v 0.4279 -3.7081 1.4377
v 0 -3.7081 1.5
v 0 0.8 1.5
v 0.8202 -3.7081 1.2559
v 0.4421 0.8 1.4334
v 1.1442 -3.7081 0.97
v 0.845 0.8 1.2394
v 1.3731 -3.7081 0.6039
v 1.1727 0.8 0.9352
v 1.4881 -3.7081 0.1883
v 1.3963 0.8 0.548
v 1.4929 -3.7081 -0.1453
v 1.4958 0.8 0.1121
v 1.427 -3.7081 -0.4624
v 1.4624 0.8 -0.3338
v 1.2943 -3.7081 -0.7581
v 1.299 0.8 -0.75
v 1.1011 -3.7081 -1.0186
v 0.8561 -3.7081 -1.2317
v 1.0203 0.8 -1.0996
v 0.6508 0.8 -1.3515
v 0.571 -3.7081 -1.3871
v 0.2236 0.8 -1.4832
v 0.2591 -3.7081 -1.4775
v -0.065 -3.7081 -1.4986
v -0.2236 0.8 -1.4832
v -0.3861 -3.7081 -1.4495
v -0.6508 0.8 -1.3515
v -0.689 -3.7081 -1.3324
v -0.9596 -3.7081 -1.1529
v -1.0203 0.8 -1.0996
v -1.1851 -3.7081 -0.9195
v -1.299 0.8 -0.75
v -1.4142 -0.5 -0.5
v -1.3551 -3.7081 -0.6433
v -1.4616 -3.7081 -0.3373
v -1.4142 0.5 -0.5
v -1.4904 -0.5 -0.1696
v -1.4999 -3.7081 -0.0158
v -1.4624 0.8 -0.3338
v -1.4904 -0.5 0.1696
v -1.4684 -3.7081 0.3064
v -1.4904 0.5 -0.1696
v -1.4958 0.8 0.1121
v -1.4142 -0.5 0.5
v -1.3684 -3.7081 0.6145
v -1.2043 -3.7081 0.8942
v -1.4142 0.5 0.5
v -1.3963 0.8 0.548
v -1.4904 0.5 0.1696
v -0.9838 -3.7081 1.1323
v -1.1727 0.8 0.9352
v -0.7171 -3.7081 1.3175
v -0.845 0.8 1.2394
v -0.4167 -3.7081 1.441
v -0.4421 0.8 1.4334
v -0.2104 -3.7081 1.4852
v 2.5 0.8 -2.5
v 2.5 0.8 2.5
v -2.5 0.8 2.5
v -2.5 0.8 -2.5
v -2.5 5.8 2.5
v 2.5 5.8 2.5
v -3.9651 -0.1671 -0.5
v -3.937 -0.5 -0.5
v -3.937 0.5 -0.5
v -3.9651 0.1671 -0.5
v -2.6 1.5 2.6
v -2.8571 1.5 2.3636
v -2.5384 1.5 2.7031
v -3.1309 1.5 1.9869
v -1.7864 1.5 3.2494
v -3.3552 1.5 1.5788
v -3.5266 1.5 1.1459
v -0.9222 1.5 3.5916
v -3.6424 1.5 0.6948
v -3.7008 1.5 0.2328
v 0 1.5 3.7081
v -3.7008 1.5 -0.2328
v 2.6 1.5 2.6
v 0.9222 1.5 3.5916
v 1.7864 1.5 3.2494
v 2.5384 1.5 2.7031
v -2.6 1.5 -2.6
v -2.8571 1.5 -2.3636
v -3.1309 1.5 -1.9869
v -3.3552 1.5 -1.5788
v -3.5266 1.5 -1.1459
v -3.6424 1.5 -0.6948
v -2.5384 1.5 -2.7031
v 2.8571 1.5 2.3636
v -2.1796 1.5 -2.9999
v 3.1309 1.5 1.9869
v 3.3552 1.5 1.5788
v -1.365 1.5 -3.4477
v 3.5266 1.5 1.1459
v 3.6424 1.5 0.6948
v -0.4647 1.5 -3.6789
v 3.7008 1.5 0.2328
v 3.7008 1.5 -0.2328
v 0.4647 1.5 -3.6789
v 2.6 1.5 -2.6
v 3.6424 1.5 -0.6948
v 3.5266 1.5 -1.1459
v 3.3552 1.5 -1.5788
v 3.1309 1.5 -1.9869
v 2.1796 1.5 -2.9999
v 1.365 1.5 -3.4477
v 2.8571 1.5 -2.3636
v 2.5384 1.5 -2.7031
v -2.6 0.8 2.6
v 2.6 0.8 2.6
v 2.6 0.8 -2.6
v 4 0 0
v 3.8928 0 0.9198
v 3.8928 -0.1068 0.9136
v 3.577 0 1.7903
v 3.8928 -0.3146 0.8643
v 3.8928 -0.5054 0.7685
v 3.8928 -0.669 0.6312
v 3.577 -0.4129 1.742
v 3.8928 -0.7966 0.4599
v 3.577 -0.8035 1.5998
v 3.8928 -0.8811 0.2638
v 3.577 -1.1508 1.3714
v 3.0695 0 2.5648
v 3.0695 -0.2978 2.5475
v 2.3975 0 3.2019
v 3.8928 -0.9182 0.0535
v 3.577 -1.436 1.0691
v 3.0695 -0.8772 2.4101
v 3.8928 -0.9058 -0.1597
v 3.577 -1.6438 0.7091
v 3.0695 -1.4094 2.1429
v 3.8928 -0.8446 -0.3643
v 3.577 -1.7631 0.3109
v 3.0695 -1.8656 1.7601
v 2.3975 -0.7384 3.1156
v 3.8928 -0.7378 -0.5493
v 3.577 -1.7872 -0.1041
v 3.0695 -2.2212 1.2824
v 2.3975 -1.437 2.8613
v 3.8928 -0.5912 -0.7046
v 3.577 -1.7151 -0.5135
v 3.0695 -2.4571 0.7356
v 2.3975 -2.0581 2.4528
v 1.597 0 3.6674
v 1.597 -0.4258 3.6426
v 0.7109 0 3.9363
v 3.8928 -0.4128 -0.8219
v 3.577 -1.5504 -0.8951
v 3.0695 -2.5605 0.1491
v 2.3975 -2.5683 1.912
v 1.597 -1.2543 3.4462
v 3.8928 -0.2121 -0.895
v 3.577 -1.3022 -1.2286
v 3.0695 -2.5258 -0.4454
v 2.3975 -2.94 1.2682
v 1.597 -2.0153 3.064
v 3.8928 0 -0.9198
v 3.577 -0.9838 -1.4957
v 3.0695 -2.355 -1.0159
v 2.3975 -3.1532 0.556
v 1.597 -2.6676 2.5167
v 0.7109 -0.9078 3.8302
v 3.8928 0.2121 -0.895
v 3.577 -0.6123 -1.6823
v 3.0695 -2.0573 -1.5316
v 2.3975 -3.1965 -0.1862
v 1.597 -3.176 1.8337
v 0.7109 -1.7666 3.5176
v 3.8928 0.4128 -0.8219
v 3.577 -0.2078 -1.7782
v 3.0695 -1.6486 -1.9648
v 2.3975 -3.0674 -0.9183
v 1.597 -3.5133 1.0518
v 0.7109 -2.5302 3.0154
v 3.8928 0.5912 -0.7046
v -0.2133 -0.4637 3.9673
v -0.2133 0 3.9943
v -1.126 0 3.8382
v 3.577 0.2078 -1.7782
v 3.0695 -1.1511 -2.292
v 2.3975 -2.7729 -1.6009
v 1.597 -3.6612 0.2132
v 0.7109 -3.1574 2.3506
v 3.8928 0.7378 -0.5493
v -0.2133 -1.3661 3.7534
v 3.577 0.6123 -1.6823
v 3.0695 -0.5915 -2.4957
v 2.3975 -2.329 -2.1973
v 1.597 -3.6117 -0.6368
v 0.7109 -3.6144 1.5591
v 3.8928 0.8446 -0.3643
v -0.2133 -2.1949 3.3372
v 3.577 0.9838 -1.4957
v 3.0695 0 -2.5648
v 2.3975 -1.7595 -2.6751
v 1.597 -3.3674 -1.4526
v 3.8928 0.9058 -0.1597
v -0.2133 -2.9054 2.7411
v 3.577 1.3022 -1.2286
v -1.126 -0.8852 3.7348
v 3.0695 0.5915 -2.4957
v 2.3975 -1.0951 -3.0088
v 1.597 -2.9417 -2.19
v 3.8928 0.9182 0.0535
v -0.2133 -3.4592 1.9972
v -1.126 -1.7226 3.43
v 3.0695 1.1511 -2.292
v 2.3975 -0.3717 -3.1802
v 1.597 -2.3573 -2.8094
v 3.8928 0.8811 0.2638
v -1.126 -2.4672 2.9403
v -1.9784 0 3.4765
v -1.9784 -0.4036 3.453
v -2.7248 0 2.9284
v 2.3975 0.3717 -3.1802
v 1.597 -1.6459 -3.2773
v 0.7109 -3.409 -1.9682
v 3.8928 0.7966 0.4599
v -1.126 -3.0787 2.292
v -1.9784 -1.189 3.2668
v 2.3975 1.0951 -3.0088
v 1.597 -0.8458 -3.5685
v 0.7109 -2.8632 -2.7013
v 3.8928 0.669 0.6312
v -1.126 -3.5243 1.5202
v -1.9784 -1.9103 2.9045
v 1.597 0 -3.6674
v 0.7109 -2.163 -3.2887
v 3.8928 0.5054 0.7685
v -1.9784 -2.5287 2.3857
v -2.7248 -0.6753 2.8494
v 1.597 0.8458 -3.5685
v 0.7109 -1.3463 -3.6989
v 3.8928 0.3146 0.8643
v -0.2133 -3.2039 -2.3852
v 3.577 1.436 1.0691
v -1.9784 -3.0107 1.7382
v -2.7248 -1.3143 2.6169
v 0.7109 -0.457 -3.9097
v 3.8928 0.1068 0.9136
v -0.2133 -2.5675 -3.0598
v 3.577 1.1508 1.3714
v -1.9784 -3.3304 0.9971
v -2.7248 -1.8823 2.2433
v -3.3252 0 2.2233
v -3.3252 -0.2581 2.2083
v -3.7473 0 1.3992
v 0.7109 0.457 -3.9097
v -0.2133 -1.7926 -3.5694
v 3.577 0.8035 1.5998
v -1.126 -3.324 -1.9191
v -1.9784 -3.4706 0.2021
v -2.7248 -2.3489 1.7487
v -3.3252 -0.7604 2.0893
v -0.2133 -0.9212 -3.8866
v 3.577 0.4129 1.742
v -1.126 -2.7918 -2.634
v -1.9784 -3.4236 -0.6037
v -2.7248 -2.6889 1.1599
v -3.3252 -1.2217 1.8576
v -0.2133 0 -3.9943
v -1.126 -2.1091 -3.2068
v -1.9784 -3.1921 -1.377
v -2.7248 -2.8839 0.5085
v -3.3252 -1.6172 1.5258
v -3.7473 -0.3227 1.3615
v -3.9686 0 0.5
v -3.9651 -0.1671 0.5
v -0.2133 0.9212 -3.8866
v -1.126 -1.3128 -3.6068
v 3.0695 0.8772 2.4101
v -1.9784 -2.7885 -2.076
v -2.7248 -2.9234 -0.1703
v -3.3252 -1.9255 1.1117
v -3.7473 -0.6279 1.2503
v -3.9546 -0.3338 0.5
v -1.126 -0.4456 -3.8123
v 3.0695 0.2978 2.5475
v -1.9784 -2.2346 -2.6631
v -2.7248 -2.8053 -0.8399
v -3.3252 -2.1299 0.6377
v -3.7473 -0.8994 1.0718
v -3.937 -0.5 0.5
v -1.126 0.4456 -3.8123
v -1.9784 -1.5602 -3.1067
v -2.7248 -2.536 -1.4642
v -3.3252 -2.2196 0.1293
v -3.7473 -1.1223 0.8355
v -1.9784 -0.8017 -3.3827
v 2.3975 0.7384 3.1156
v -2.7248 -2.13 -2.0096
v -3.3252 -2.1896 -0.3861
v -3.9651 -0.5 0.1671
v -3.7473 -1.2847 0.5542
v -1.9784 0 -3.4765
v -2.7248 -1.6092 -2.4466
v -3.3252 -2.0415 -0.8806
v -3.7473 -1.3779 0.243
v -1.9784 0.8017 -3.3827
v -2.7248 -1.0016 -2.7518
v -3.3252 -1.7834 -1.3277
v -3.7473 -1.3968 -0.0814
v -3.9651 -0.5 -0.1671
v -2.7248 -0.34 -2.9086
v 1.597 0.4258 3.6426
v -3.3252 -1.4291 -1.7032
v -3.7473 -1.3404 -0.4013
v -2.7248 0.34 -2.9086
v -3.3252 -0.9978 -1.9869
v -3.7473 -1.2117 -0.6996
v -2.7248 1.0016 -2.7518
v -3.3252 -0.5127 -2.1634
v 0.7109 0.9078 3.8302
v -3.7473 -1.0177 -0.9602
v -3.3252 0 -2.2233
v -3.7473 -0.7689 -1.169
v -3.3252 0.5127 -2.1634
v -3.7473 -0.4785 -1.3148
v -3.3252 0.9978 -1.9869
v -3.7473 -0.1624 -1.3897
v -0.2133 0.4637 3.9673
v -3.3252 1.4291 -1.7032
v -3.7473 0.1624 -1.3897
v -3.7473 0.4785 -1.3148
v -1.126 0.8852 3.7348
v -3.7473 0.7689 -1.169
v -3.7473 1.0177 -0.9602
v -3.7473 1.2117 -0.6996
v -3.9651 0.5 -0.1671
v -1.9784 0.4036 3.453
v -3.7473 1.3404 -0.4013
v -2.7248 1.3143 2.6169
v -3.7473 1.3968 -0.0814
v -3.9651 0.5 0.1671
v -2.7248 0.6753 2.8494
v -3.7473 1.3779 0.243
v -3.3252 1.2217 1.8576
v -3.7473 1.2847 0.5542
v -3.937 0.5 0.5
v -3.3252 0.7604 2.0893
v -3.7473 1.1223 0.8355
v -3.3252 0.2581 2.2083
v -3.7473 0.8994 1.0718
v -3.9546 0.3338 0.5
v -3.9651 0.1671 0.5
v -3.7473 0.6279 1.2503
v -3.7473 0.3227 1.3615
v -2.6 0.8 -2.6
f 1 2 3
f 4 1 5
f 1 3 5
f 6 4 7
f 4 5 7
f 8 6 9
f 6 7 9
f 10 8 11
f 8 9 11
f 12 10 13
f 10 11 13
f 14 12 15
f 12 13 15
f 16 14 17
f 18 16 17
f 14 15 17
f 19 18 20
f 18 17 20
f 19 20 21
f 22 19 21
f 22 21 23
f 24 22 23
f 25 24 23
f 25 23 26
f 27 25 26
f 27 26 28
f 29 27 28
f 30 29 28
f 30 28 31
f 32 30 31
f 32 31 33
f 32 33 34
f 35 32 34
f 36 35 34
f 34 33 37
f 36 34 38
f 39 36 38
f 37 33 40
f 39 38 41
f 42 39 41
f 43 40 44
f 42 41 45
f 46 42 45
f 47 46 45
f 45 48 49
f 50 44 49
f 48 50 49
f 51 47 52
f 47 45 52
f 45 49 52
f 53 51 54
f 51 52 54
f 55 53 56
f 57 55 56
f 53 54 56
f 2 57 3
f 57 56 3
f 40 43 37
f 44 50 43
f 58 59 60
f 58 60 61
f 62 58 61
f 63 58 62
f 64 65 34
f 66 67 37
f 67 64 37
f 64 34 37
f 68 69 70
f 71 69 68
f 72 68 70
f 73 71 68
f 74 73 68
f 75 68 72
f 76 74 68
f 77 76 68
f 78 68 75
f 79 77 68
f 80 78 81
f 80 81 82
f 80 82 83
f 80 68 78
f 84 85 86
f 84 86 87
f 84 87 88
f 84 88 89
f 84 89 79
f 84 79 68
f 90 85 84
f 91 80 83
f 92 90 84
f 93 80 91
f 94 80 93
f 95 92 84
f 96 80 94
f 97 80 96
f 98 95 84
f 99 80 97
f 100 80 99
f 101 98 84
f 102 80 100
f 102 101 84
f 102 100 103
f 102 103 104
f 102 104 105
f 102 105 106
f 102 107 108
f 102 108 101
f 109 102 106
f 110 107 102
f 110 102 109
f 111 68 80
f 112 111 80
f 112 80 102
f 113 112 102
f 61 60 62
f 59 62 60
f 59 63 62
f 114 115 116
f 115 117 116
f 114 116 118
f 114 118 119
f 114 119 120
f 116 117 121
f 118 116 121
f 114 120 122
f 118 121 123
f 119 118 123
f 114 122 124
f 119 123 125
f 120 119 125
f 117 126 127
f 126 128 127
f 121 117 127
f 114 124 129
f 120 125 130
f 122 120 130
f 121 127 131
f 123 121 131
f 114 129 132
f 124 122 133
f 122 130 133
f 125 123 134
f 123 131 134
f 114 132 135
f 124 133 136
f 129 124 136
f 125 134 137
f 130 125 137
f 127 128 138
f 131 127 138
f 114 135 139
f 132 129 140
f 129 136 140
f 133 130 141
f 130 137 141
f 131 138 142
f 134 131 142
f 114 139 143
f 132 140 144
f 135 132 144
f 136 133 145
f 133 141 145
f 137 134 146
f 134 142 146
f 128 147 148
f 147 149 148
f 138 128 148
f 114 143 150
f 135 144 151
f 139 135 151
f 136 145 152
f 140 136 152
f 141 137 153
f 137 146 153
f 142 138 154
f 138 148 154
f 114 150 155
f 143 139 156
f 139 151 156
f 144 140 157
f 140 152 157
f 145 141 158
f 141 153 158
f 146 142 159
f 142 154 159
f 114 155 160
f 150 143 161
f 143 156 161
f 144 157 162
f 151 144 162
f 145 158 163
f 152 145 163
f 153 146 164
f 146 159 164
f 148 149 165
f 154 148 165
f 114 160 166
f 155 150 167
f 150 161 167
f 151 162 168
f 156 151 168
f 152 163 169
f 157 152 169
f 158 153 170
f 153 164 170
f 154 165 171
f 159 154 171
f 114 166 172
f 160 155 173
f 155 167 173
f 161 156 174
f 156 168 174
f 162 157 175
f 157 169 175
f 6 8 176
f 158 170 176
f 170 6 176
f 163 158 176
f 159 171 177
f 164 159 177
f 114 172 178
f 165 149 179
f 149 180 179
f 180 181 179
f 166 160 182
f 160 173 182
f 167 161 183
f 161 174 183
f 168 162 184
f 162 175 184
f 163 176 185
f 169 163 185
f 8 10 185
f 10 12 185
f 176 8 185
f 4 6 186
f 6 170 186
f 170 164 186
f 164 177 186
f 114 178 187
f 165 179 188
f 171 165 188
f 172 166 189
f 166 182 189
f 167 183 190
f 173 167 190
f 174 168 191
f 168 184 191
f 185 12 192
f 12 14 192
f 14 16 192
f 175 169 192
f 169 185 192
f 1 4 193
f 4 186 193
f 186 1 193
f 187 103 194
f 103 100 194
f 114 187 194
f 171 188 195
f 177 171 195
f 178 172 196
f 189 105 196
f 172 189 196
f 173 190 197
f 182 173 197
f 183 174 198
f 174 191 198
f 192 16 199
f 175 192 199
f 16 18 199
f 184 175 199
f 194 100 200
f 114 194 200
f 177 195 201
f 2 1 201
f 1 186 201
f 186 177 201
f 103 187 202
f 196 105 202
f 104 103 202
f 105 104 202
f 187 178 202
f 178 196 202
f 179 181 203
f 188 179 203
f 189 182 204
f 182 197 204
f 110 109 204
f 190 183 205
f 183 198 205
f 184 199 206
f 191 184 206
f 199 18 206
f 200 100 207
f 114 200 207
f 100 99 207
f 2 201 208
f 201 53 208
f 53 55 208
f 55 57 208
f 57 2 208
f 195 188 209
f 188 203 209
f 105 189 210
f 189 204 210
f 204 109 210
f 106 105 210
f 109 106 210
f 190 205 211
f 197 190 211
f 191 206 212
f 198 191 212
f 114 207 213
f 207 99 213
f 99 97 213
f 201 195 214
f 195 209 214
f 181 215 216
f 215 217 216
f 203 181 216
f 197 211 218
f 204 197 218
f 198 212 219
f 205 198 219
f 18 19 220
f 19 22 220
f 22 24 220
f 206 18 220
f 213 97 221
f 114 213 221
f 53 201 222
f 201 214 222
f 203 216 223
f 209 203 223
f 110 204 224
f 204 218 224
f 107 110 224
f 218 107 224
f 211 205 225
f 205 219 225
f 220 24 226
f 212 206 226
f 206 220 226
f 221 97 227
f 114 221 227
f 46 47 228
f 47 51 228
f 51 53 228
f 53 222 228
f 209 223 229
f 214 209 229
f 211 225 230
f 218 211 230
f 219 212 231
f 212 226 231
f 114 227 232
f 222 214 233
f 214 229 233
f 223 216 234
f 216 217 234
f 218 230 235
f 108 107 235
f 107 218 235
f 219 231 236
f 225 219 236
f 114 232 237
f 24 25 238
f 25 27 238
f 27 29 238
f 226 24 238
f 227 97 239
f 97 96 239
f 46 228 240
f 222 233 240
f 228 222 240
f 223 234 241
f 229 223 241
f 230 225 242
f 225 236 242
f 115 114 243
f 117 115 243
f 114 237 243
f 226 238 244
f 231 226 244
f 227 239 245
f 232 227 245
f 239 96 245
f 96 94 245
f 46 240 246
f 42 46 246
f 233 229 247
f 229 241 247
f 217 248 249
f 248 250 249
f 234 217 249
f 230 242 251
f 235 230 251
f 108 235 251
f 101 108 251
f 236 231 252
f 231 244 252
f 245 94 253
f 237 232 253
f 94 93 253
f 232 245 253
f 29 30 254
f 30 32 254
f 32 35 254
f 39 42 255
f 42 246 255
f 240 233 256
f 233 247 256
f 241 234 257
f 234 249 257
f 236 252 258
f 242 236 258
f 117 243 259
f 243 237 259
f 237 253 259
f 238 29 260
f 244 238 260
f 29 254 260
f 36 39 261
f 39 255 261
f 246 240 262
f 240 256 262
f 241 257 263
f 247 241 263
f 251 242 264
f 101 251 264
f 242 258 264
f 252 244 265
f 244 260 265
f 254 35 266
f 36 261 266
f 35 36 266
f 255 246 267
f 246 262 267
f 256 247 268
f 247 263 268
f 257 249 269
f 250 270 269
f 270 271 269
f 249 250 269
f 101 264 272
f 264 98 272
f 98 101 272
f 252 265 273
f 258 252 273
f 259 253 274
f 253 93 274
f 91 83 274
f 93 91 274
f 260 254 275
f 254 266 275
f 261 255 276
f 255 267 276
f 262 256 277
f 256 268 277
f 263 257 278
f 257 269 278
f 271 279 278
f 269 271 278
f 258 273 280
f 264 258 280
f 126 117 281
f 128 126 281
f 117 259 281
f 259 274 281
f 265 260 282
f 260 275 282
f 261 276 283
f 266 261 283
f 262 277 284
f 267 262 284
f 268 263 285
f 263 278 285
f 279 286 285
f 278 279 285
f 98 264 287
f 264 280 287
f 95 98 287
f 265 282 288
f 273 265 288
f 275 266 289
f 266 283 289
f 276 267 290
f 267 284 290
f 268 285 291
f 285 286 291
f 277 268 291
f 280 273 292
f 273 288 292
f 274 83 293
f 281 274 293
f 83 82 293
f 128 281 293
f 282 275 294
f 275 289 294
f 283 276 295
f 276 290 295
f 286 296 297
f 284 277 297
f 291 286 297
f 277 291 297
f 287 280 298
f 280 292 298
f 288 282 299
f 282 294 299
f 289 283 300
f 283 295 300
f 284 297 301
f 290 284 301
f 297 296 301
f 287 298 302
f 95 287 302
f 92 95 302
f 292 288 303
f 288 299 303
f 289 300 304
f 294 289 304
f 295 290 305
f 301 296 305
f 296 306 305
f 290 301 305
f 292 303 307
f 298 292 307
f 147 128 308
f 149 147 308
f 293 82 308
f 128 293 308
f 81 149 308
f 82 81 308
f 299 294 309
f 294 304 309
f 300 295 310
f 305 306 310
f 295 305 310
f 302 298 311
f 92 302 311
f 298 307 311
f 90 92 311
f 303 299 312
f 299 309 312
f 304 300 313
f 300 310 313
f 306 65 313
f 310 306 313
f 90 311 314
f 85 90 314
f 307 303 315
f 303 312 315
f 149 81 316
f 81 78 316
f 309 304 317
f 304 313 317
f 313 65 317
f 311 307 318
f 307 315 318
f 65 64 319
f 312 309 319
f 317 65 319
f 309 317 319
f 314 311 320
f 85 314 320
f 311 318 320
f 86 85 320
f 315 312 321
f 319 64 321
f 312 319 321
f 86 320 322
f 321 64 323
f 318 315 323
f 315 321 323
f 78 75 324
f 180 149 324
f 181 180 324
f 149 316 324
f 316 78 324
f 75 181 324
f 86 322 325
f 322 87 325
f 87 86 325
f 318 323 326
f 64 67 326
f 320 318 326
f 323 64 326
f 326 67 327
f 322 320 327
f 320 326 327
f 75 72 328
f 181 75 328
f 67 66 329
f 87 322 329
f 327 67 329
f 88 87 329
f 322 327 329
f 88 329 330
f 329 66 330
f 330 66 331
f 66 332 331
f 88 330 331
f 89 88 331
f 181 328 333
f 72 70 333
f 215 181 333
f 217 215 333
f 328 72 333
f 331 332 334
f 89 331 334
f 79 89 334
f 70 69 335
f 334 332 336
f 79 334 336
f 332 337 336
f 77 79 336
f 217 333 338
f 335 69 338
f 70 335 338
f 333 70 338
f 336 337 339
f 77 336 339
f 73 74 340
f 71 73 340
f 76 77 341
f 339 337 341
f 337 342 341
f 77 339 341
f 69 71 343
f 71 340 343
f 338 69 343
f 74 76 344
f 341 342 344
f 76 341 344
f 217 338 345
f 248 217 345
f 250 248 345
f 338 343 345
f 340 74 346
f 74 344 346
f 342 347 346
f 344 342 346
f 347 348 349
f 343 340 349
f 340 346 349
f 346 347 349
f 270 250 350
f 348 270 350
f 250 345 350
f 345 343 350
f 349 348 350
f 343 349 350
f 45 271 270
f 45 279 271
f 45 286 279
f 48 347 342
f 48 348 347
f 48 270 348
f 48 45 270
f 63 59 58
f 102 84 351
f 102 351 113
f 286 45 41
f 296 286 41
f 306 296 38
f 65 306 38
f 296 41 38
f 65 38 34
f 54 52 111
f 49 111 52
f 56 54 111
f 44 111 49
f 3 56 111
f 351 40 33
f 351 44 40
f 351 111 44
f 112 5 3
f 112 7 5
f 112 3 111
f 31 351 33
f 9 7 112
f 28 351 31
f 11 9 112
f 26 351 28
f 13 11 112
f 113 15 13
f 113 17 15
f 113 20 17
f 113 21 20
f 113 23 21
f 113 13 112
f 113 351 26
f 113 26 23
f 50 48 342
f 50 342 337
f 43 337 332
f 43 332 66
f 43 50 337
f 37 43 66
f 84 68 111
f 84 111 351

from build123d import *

# Parameters (mm, degrees)
SKETCH_2_W               = 8
SKETCH_2_H               = 8
CUT_EXTRUDE_1_DEPTH      = 10
SKETCH_6_R               = 1.5
CUT_EXTRUDE_2_DEPTH      = 9.246211251
SKETCH_8_W               = 5
SKETCH_8_H               = 5
CUT_EXTRUDE_3_DEPTH      = 1.2
EXTRUDE_4_DEPTH          = 2.5
SKETCH_11_R              = 3.996071485
SKETCH_11_W              = 5
SKETCH_11_H              = 5
CUT_EXTRUDE_5_DEPTH      = 0.5
CUT_EXTRUDE_6_REACH      = 10.102
CUT_EXTRUDE_6_END_RADIUS = 4
SKETCH_12_W              = 1
SKETCH_12_H              = 1
SKETCH_13_W              = 5.2
SKETCH_13_H              = 5.2
SKETCH_13_W_2            = 5
SKETCH_13_H_2            = 5
CUT_EXTRUDE_1_2_DEPTH    = 0.7


with BuildPart() as part:
    # 草图1 → 旋转1 (revolve)
    with BuildSketch(Plane(origin=(0, 0, 0), x_dir=(1, 0, 0), z_dir=(0, 1, 0))):
        with BuildLine():
            Line((-4, 0), (4, 0))
            ThreePointArc((4, 0), (0, -4), (-4, 0))
        make_face()
    revolve(axis=Axis((-4, 0, 0), (1, 0, 0)))

    # 草图2 → Cut-Extrude 1 (cut)
    with BuildSketch(Plane(origin=(0, 2, 0), x_dir=(1, 0, 0), z_dir=(0, 1, 0))):
        Rectangle(SKETCH_2_W, SKETCH_2_H)
    extrude(amount=CUT_EXTRUDE_1_DEPTH, mode=Mode.SUBTRACT)

    # 草图6 → 切除-拉伸2 (cut, through all)
    with BuildSketch(Plane(origin=(0, 2, 0), x_dir=(1, 0, 0), z_dir=(0, 1, 0))):
        with Locations(Location((0, 0, 0), (0, 0, 270))):
            Circle(SKETCH_6_R)
    extrude(amount=-CUT_EXTRUDE_2_DEPTH, mode=Mode.SUBTRACT)

    # 草图8 → 切除-拉伸3 (cut)
    with BuildSketch(Plane(origin=(0, 2, 0), x_dir=(1, 0, 0), z_dir=(0, 1, 0))):
        Rectangle(SKETCH_8_W, SKETCH_8_H)
    extrude(amount=-CUT_EXTRUDE_3_DEPTH, mode=Mode.SUBTRACT)

    # 草图11 → 切除-拉伸5 (cut)
    with BuildSketch(Plane(origin=(0, 2, 0), x_dir=(1, 0, 0), z_dir=(0, 1, 0))):
        Circle(SKETCH_11_R)
        Rectangle(SKETCH_11_W, SKETCH_11_H, mode=Mode.SUBTRACT)
    extrude(amount=-CUT_EXTRUDE_5_DEPTH, mode=Mode.SUBTRACT)

    # 切除-拉伸6: up to this sphere (the profile starts inside it)
    cut_extrude_6_end = Location((0, 0, 0)) * Sphere(CUT_EXTRUDE_6_END_RADIUS, mode=Mode.PRIVATE)
    # 草图12 → 切除-拉伸6 (cut, up to the surface)
    with BuildSketch(Plane(origin=(0, 0, 0), x_dir=(0, 0, -1), z_dir=(1, 0, 0)), mode=Mode.PRIVATE) as cut_extrude_6_sk1:
        Rectangle(SKETCH_12_W, SKETCH_12_H)
    cut_extrude_6_tool1 = extrude(cut_extrude_6_sk1.sketch, amount=-CUT_EXTRUDE_6_REACH, mode=Mode.PRIVATE) & cut_extrude_6_end
    add(cut_extrude_6_tool1.solids().sort_by_distance((0, 0, 0))[0], mode=Mode.SUBTRACT)

    # 草图13 → Cut-Extrude 1 2 (cut)
    with BuildSketch(Plane(origin=(0, 1.5, 0), x_dir=(1, 0, 0), z_dir=(0, 1, 0))):
        Rectangle(SKETCH_13_W, SKETCH_13_H)
        Rectangle(SKETCH_13_W_2, SKETCH_13_H_2, mode=Mode.SUBTRACT)
    extrude(amount=-CUT_EXTRUDE_1_2_DEPTH, mode=Mode.SUBTRACT)


with BuildPart() as body_2:
    # 草图7 → 凸台-拉伸4 (new, symmetric)
    with BuildSketch(Plane(origin=(0, 0, 0), x_dir=(0, 0, -1), z_dir=(1, 0, 0))):
        Polygon((-2.5, 5.8), (-2.5, 0.8), (2.5, 0.8), align=None)
    extrude(amount=EXTRUDE_4_DEPTH, both=True)


solid = Compound([part.part, body_2.part])
